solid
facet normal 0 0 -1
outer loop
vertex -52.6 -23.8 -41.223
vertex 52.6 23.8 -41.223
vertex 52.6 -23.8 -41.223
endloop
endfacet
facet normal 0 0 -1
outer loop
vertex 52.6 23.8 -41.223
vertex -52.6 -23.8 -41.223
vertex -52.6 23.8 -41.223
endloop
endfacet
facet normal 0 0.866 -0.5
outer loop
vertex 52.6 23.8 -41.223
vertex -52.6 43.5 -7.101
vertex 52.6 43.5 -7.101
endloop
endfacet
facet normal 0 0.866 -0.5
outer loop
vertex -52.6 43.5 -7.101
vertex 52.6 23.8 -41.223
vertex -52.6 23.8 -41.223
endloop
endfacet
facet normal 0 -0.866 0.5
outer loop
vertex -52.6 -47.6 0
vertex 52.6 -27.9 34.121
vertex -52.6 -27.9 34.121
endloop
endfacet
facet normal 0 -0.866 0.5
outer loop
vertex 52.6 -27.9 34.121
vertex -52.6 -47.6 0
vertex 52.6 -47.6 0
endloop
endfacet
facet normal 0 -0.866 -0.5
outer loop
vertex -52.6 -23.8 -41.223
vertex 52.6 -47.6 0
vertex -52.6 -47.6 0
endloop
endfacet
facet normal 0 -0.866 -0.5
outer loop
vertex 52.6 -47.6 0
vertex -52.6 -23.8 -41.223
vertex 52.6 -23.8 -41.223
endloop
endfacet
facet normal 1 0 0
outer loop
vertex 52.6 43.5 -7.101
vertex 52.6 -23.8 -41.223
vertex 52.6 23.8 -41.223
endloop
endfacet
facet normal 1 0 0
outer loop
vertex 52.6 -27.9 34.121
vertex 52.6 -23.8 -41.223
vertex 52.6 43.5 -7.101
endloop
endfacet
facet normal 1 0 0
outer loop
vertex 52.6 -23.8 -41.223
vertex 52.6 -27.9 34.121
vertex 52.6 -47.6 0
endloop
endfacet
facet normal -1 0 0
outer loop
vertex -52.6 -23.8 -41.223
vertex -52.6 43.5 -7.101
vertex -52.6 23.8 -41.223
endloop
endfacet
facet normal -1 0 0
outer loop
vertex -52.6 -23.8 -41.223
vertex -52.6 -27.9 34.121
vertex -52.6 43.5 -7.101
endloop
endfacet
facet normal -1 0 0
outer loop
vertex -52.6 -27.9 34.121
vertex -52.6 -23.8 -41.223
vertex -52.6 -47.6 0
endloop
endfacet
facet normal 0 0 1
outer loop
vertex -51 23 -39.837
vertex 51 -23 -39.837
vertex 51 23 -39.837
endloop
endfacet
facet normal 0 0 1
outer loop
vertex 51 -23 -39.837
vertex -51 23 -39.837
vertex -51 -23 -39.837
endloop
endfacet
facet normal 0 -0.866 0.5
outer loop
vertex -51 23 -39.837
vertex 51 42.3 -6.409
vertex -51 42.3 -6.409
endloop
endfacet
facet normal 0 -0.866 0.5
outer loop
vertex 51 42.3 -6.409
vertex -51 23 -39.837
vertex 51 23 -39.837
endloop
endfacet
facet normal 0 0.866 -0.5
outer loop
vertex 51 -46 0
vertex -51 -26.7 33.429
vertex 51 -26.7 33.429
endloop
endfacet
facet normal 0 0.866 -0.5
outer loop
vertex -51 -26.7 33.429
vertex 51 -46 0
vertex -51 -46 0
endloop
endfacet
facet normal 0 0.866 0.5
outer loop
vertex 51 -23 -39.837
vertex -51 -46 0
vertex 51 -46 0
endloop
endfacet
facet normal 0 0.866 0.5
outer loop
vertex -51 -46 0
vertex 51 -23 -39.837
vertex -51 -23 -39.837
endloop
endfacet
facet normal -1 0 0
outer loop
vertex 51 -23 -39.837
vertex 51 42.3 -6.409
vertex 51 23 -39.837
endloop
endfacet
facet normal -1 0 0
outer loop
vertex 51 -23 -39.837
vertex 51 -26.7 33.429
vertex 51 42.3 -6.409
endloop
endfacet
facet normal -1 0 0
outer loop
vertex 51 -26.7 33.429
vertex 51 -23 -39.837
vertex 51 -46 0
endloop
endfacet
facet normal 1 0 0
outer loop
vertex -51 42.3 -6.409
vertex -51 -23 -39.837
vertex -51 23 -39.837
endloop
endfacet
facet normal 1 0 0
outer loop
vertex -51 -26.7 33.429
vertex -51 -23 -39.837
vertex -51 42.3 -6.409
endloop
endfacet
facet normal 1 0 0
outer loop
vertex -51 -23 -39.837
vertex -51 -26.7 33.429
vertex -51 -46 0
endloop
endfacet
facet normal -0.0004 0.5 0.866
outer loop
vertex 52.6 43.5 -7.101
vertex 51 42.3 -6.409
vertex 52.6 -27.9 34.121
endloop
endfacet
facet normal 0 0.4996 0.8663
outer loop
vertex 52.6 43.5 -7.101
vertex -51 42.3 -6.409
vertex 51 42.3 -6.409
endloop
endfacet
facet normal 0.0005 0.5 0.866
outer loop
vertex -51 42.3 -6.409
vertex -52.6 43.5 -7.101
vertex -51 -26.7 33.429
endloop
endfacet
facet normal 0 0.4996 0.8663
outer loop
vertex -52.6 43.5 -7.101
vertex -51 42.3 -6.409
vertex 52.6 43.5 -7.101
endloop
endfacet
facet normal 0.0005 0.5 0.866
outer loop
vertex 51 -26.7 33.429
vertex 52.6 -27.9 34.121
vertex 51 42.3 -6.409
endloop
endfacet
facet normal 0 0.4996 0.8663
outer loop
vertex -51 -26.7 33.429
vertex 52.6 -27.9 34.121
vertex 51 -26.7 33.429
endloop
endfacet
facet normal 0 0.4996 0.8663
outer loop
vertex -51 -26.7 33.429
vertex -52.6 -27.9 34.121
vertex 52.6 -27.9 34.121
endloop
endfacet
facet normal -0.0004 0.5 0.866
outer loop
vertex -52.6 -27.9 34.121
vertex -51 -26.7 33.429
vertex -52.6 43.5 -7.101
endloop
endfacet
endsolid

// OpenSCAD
/* [Container] */
// Create a tile container for hexagon tiles.
// example: Catan tiles: Mayfair editions: base + seafarers + 5-6 expansion for both.
// diameter of hex tile (mm).  Measure point to point across center of tile.  Add a few extra mm so tiles fit nicely.
_d = 92;  

// Length of container (mm). Add a few extra mm so tiles fit nicely.
_l = 102; 

// thickness of container walls (mm)
_wall_thickness = 1.6; 

/* [Lid parameters] */
// generate a lid (instead of container) that will fit the storage container defined by other params
_generate = "container"; //[container, lid] 

// wall thickness of lid
_lid_wall_thickness = 1.2; 
// The lid will be snug, depending on printer.  Provide a negative to make tighter, positive to make looser fitting lid (ex: 0.2, will make a looser fitting lid.
_lid_fudge = 0;  

module hex_holder(diam, l, wall, extra_cut = 0)
{
	outer_d = diam + (wall * 2);
	outer_l = l + (wall * 2);
	difference() {
		rotate([0,0,30]) cylinder(outer_l,d=outer_d,d=outer_d, center = true, $fn=6);
		rotate([0,0,30]) cylinder(l,d=diam,d=diam, center = true, $fn=6);
		translate([0,(diam * (11/16)) - extra_cut,0])  
            cube([outer_d + .1,outer_d +  .1,outer_l + .1], center=true);
	}
}


if(_generate == "lid")
{
    rotate([60,0,0])
    rotate([0,90,0])
    hex_holder(_d + (2 * _wall_thickness) + 1.5 + _lid_fudge
                , _l + (2 * _wall_thickness) + 1.2 + _lid_fudge
                , _lid_wall_thickness 
                ,((21/16) * _wall_thickness) + _lid_wall_thickness);
}
if(_generate == "container")
{
    rotate([60,0,0])
    rotate([0,90,0])
    hex_holder(_d, _l, _wall_thickness);
}

//ex: // Neuroshima Hex tiles:
//_d = 41; 
//_l = 62;
